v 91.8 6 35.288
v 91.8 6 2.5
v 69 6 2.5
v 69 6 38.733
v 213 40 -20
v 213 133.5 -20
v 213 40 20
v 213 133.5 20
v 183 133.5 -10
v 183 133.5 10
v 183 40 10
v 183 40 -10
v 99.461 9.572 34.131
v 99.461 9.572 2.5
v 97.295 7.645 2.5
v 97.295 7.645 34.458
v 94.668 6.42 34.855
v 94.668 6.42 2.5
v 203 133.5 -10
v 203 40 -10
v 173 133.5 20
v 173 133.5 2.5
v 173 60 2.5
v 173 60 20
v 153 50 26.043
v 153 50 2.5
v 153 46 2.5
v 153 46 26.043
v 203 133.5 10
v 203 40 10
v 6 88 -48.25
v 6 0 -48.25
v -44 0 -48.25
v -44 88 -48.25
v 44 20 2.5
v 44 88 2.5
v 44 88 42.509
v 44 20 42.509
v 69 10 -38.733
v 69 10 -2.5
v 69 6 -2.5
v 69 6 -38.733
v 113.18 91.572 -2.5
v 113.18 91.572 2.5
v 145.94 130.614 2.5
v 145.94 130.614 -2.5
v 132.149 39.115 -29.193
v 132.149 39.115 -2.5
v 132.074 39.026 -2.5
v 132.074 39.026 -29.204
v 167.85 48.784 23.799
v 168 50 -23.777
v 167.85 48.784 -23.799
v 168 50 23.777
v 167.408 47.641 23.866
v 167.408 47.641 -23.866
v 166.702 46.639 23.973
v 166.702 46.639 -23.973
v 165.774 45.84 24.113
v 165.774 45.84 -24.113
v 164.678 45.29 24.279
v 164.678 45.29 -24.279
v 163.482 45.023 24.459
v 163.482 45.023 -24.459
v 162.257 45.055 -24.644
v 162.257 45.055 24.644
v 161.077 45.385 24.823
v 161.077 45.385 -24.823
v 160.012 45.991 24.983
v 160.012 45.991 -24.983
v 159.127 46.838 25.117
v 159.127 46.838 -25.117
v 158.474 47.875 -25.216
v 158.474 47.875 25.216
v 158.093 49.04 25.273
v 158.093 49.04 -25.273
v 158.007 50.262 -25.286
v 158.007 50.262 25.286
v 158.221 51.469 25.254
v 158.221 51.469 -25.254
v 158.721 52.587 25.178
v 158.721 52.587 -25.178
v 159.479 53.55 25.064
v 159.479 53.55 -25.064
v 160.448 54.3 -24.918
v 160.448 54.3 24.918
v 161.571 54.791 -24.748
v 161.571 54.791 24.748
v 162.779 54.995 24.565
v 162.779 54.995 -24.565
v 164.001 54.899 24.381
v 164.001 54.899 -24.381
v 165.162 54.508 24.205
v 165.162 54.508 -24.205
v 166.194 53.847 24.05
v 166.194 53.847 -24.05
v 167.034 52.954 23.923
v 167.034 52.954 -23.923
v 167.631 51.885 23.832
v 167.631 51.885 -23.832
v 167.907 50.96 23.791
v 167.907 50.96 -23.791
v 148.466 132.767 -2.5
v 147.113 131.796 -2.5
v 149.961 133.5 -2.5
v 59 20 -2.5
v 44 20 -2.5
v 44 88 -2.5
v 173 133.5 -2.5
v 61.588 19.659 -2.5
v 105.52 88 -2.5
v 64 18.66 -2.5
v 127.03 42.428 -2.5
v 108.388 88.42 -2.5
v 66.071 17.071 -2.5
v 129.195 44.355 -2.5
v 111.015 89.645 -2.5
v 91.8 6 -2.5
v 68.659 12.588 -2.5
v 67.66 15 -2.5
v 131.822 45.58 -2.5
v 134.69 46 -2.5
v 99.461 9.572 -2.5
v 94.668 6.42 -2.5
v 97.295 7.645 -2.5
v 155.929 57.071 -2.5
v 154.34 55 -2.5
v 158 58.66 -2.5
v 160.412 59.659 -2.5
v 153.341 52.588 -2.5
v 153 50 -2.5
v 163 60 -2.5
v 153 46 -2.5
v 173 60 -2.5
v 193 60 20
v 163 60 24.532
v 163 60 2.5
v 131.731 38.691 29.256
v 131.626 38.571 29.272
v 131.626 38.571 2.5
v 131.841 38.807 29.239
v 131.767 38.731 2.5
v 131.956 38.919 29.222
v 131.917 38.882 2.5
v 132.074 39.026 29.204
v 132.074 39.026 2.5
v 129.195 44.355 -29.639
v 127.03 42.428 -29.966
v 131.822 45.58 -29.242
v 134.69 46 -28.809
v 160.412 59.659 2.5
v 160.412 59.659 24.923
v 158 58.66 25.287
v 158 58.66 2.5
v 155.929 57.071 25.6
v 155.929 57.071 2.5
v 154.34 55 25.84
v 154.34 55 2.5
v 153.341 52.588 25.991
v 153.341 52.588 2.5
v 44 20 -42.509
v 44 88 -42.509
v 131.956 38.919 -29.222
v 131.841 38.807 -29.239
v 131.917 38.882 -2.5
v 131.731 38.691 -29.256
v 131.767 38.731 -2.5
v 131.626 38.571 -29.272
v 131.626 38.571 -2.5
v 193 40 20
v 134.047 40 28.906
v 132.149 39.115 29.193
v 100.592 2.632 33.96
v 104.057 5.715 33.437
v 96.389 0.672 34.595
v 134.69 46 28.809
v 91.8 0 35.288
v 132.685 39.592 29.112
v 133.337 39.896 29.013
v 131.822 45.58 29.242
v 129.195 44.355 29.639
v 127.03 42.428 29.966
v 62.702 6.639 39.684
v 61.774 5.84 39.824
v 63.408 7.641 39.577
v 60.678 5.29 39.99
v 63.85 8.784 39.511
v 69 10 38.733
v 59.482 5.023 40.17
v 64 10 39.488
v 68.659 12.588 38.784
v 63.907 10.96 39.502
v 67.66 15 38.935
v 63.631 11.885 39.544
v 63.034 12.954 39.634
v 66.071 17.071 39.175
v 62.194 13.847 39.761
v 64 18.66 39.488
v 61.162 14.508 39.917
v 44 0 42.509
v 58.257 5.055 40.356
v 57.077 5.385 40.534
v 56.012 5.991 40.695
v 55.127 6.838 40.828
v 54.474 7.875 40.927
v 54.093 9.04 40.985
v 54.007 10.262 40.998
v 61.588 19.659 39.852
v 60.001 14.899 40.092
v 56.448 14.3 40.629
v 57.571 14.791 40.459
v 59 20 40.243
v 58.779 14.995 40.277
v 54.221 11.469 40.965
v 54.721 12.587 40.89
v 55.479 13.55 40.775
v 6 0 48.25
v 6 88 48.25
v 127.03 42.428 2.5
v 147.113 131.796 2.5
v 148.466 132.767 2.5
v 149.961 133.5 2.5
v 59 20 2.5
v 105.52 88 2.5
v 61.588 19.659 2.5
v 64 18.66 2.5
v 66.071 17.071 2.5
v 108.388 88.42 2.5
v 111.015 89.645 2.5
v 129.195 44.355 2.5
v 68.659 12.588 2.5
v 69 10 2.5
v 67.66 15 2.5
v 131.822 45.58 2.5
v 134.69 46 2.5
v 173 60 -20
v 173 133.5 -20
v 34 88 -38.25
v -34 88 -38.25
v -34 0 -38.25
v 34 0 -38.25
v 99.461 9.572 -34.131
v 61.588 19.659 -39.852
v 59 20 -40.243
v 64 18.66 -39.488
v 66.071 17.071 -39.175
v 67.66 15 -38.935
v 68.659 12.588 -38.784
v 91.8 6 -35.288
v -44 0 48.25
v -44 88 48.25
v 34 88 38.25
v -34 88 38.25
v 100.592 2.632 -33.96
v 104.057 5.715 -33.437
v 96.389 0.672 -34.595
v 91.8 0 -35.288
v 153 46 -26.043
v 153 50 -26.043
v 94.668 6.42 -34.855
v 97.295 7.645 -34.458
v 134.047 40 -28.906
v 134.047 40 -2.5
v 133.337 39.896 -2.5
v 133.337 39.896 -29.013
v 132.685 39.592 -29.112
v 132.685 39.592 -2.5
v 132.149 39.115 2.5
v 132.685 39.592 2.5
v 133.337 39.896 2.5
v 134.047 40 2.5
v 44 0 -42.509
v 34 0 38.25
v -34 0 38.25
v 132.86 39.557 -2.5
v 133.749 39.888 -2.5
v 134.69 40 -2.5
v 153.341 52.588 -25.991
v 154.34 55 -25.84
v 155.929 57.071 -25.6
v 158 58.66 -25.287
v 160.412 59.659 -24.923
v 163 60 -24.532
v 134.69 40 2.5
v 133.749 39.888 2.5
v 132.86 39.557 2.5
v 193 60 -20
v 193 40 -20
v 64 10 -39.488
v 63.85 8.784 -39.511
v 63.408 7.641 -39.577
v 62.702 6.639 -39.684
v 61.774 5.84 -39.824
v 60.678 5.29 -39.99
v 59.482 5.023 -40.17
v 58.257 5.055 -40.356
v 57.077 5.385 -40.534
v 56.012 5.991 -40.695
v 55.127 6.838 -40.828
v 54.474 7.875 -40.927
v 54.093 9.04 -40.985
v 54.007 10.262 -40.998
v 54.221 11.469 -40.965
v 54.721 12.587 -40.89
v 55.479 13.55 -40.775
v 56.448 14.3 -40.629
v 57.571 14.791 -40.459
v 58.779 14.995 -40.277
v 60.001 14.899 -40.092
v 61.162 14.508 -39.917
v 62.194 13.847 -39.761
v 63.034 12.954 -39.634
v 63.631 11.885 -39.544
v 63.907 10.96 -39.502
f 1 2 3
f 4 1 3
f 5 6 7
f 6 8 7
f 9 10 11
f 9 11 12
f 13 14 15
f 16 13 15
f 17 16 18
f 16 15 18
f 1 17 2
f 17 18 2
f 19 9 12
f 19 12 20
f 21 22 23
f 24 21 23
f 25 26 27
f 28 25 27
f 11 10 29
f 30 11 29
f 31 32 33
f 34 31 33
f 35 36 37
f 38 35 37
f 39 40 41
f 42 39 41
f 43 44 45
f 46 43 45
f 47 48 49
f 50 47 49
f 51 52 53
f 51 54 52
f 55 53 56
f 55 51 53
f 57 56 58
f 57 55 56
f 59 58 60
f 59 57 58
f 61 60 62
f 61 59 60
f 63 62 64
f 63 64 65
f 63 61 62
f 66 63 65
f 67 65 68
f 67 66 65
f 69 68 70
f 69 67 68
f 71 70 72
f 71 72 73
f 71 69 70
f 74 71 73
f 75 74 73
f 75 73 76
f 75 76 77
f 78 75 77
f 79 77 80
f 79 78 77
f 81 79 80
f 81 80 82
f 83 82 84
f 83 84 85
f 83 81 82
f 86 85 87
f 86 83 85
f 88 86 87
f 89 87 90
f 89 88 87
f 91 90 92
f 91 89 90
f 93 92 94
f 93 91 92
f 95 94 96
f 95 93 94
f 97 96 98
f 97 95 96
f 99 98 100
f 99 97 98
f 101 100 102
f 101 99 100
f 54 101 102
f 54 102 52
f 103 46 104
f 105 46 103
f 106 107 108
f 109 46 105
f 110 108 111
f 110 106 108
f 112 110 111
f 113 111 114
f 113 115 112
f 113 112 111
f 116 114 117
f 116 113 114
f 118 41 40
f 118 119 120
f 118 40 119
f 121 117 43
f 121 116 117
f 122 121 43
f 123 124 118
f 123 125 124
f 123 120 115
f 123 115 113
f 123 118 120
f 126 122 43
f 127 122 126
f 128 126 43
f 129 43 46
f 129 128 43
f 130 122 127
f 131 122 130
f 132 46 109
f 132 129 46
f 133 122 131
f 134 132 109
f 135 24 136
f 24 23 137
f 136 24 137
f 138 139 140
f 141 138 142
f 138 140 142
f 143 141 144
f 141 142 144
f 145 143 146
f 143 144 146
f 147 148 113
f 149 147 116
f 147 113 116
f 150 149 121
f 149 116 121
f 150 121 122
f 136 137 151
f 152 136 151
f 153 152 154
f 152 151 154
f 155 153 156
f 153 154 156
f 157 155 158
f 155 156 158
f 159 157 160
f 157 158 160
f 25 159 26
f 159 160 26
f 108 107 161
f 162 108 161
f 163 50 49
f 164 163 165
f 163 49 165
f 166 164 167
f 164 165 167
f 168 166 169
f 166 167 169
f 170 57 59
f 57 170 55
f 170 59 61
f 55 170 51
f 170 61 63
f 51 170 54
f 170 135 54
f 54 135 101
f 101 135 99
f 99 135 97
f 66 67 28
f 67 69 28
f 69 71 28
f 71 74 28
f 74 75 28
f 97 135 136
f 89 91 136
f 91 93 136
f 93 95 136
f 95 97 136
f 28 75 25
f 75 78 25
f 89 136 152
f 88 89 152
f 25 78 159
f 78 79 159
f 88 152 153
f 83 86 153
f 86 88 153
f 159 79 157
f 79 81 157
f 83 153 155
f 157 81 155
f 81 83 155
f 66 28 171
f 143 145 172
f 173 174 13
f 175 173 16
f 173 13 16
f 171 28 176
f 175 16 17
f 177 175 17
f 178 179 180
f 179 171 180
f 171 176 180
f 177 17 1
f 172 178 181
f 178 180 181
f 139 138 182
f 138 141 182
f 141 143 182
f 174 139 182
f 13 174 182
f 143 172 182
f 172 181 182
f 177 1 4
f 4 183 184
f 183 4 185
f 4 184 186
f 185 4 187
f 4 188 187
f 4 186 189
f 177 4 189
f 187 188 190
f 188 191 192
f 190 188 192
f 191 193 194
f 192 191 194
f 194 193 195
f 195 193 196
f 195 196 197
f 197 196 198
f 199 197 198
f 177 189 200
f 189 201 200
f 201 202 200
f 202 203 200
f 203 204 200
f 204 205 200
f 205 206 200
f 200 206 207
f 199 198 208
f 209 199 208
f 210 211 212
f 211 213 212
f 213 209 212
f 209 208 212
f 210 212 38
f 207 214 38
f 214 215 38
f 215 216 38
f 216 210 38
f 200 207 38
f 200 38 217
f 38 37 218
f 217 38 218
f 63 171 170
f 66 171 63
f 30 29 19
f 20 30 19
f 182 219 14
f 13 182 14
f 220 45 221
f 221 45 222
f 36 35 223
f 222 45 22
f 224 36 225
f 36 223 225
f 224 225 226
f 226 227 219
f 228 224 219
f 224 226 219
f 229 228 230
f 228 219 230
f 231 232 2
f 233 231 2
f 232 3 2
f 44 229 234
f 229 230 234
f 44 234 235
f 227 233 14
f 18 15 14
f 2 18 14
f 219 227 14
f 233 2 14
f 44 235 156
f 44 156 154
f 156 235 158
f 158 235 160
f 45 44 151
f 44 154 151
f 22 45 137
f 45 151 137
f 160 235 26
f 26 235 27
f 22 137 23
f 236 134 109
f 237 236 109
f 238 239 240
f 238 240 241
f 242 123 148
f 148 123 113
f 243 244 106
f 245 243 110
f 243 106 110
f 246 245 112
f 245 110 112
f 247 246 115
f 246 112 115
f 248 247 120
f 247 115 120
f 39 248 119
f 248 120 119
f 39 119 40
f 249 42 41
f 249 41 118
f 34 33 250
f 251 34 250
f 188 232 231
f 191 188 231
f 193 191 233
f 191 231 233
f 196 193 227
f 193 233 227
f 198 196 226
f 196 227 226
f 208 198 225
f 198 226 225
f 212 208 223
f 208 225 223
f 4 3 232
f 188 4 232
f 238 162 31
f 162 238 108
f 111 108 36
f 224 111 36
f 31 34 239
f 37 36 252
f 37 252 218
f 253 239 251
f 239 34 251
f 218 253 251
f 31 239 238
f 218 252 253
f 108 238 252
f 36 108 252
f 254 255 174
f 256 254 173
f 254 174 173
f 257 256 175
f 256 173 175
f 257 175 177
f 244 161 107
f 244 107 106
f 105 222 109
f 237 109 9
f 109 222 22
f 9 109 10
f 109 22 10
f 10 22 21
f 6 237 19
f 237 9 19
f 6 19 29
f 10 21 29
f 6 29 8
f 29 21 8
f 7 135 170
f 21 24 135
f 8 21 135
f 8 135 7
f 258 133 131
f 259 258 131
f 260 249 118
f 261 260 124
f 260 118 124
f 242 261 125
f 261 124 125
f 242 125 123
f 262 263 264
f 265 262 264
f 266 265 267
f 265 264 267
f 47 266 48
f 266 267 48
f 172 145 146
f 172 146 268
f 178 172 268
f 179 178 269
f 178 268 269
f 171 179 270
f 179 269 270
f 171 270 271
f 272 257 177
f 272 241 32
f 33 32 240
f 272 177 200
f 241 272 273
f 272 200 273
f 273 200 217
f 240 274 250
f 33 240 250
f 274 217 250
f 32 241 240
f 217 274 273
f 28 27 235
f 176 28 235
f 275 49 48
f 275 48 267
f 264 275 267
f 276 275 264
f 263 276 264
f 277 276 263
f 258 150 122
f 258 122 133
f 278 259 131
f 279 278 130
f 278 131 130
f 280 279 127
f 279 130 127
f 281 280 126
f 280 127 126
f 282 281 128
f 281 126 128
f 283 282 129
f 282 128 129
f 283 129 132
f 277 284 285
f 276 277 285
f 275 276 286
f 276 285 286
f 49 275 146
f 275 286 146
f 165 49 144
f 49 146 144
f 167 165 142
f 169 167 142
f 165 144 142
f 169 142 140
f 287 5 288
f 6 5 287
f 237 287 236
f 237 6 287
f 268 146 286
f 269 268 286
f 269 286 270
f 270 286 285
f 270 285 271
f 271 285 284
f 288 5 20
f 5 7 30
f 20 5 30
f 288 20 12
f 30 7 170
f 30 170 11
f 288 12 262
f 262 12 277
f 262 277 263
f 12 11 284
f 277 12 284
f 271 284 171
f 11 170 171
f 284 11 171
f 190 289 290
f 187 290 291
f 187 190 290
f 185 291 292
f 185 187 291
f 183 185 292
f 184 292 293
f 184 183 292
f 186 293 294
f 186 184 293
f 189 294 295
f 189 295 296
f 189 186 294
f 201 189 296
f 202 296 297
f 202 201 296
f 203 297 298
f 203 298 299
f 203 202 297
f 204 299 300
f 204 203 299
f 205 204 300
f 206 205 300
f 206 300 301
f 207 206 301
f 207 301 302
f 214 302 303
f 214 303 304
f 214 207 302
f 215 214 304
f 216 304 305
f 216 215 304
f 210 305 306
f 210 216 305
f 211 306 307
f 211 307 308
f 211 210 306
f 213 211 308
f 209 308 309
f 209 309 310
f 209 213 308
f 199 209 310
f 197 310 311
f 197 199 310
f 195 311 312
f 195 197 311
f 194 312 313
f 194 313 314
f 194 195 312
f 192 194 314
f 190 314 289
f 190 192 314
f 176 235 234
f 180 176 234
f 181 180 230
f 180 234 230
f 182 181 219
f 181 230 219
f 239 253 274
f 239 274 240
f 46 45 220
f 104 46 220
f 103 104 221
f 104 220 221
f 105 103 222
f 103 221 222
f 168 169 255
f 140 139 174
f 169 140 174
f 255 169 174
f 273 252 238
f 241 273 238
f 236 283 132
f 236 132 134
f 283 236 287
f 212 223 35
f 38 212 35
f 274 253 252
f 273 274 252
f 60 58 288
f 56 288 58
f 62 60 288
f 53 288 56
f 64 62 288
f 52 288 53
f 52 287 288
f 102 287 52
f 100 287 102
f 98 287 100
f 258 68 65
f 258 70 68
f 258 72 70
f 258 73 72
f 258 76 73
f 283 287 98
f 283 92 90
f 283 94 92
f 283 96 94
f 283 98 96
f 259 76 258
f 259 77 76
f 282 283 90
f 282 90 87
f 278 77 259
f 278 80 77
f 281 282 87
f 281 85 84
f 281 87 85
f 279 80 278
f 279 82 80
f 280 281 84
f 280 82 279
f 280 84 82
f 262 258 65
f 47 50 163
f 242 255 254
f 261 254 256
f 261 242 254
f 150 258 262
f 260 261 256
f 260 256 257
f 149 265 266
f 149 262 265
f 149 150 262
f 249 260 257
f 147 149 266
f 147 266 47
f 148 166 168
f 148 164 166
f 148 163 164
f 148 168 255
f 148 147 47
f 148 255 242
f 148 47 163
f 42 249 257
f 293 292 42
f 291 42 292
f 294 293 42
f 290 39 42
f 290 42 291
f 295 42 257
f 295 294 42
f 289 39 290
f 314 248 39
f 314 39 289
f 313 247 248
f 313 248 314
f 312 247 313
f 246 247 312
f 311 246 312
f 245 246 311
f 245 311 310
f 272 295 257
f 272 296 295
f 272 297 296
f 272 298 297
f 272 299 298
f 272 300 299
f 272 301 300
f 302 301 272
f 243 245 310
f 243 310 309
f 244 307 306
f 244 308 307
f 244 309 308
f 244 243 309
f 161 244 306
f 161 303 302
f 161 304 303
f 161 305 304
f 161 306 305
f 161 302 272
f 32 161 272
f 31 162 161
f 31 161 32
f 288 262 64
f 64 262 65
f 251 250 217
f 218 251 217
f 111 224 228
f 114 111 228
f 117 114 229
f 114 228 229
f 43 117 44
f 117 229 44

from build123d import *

# Parameters (mm, degrees)
BOSS_EXTRU_3_DEPTH       = 88
ESQUISSE4_W              = 68
ESQUISSE4_H              = 76.5
ENL_V_MAT_EXTRU_1_DEPTH  = 236.459258684
ENL_V_MAT_EXTRU_2_DEPTH  = 68
ENL_V_MAT_EXTRU_5_REACH  = 245.615
ESQUISSE6_W              = 150.690647389
ESQUISSE6_H              = 20
BOSS_EXTRU_5_DEPTH       = 20
ESQUISSE14_W             = 40
ESQUISSE14_H             = 40
ENL_V_MAT_EXTRU_6_DEPTH  = 236.459258684
BOSS_EXTRU_8_DEPTH       = 40
ENL_V_MAT_EXTRU_7_DEPTH  = 236.984242059
ESQUISSE27_W             = 169
ESQUISSE27_H             = 5
BOSS_EXTRU_9_DEPTH       = 45.5
BOSS_EXTRU_10_REACH      = 258.45
ESQUISSE28_R             = 5
ENL_V_MAT_EXTRU_9_DEPTH  = 45.5
BOSS_EXTRU_12_DEPTH      = 17.5
ENL_V_MAT_EXTRU_10_REACH = 248.129
BOSS_EXTRU_13_REACH      = 258.45
ESQUISSE34_R             = 5
BOSS_EXTRU_14_DEPTH      = 17.5
ESQUISSE36_W             = 20
ESQUISSE36_H             = 20
ENL_V_MAT_EXTRU_11_DEPTH = 256.967405152
ESQUISSE37_R             = 5
ENL_V_MAT_EXTRU_12_DEPTH = 10
ESQUISSE38_R             = 5
ENL_V_MAT_EXTRU_13_DEPTH = 10


with BuildPart() as part:
    # Esquisse1 → Boss.-Extru.3 (new body)
    with BuildSketch(Plane(origin=(0, 0, 0), x_dir=(1, 0, 0), z_dir=(0, 1, 0))):
        Polygon((193, 20), (6, 48.25), (-44, 48.25), (-44, -48.25), (6, -48.25), (193, -20), (213, -20), (213, 20), align=None)
    extrude(amount=BOSS_EXTRU_3_DEPTH)

    # Esquisse4 → Enlèv. mat.-Extru.1 (cut, through all)
    with BuildSketch(Plane(origin=(0, 88, 0), x_dir=(1, 0, 0), z_dir=(0, 1, 0))):
        Rectangle(ESQUISSE4_W, ESQUISSE4_H)
    extrude(amount=-ENL_V_MAT_EXTRU_1_DEPTH, mode=Mode.SUBTRACT)

    # Esquisse5 → Enlèv. mat.-Extru.2 (cut)
    with BuildSketch(Plane(origin=(0, 88, 0), x_dir=(1, 0, 0), z_dir=(0, 1, 0))):
        Polygon((193, 20), (173, 20), (173, 2.5), (44, 2.5), (44, 42.509358289), align=None)
        Polygon((173, -20), (193, -20), (44, -42.509358289), (44, -2.5), (173, -2.5), align=None)
    extrude(amount=-ENL_V_MAT_EXTRU_2_DEPTH, mode=Mode.SUBTRACT)

    # Enlèv. mat.-Extru.5: up to this plane
    enl_v_mat_extru_5_end = Plane(origin=(173, 20, 2.5), z_dir=(0, 0, -1))
    # Esquisse6 → Enlèv. mat.-Extru.5 (cut, up to the surface)
    with BuildSketch(Plane(origin=(7.260340781, 0, 48.059600925), x_dir=(0.9887806747234926, 0, -0.14937462064673088), z_dir=(0.14937462064673088, 0, 0.9887806747234927)), mode=Mode.PRIVATE) as enl_v_mat_extru_5_sk1:
        with Locations((112.501854115, 10)):
            Rectangle(ESQUISSE6_W, ESQUISSE6_H)
    enl_v_mat_extru_5_tool1 = split(extrude(enl_v_mat_extru_5_sk1.sketch, amount=-ENL_V_MAT_EXTRU_5_REACH, mode=Mode.PRIVATE), bisect_by=enl_v_mat_extru_5_end, keep=Keep.BOTH, mode=Mode.PRIVATE)
    add(enl_v_mat_extru_5_tool1.solids().sort_by_distance((118.5, 10, 31.254679))[0], mode=Mode.SUBTRACT)

    # Esquisse11 → Boss.-Extru.5 (add)
    with BuildSketch(Plane.XZ.offset(-20)):
        Polygon((37.955805499, 2.5), (44, 2.5), (44, 42.509358289), align=None)
    extrude(amount=BOSS_EXTRU_5_DEPTH)

    # Esquisse14 → Enlèv. mat.-Extru.6 (cut, through all)
    with BuildSketch(Plane(origin=(0, 88, 0), x_dir=(1, 0, 0), z_dir=(0, 1, 0))):
        with Locations((193, 0)):
            Rectangle(ESQUISSE14_W, ESQUISSE14_H)
    extrude(amount=-ENL_V_MAT_EXTRU_6_DEPTH, mode=Mode.SUBTRACT)

    # Esquisse22 → Boss.-Extru.8 (add)
    with BuildSketch(Plane(origin=(173, 0, 0), x_dir=(0, 0, -1), z_dir=(1, 0, 0))):
        Polygon((-2.5, 0), (20, 0), (20, 20), (2.5, 20), (2.5, 88), (-2.5, 88), align=None)
    extrude(amount=BOSS_EXTRU_8_DEPTH)

    # Esquisse23 → Enlèv. mat.-Extru.7 (cut, through all)
    with BuildSketch(Plane.XY.offset(2.5)):
        with BuildLine():
            Line((213, 0), (213, 40))
            Line((213, 40), (193, 40))
            Line((193, 40), (159, 40))
            Line((159, 40), (134.690473047, 40))
            ThreePointArc((134.690473047, 40), (133, 39.625231148), (131.626295274, 38.571150439))
            Line((131.626295274, 38.571150439), (104.057045727, 5.715398245))
            ThreePointArc((104.057045727, 5.715398245), (98.562226825, 1.499075407), (91.800334637, 0))
            Line((91.800334637, 0), (213, 0))
        make_face()
    extrude(amount=-ENL_V_MAT_EXTRU_7_DEPTH, mode=Mode.SUBTRACT)

    # Esquisse27 → Boss.-Extru.9 (add)
    with BuildSketch(Plane(origin=(0, 88, 0), x_dir=(1, 0, 0), z_dir=(0, 1, 0))):
        with Locations((128.5, 0)):
            Rectangle(ESQUISSE27_W, ESQUISSE27_H)
    extrude(amount=BOSS_EXTRU_9_DEPTH)

    # Boss.-Extru.10: up to this plane
    boss_extru_10_end = Plane(origin=(7.260340781, 88, 48.059600925), z_dir=(-0.14937462064673085, 0, -0.9887806747234926))
    # Esquisse28 → Boss.-Extru.10 (add, up to the surface)
    with BuildSketch(Plane.XY.offset(2.5), mode=Mode.PRIVATE) as boss_extru_10_sk1:
        with BuildLine():
            Line((132.074257782, 39.025792076), (132.14881397, 39.114644681))
            ThreePointArc((132.14881397, 39.114644681), (133, 39.767782693), (134.047464579, 40))
            Line((134.047464579, 40), (134.690473047, 40))
            Line((134.690473047, 40), (159, 40))
            Line((159, 40), (193, 40))
            Line((193, 40), (193, 60))
            Line((193, 60), (173, 60))
            Line((173, 60), (163, 60))
            ThreePointArc((163, 60), (155.928932188, 57.071067812), (153, 50))
            Line((153, 50), (153, 46))
            Line((153, 46), (134.690473047, 46))
            ThreePointArc((134.690473047, 46), (130.46429043, 45.06307787), (127.030028616, 42.427876097))
            Line((127.030028616, 42.427876097), (99.460779068, 9.572123903))
            ThreePointArc((99.460779068, 9.572123903), (96.026517254, 6.93692213), (91.800334637, 6))
            Line((91.800334637, 6), (69, 6))
            Line((69, 6), (69, 10))
            ThreePointArc((69, 10), (66.071067812, 17.071067812), (59, 20))
            Line((59, 20), (44, 20))
            Line((44, 20), (44, 0))
            Line((44, 0), (63, 0))
            Line((63, 0), (91.800334637, 0))
            ThreePointArc((91.800334637, 0), (98.562226825, 1.499075407), (104.057045727, 5.715398245))
            Line((104.057045727, 5.715398245), (131.626295274, 38.571150439))
            ThreePointArc((131.626295274, 38.571150439), (131.841194012, 38.807420343), (132.074257782, 39.025792076))
        make_face()
        with Locations((59, 10)):
            Circle(ESQUISSE28_R, mode=Mode.SUBTRACT)
        with Locations((163, 50)):
            Circle(ESQUISSE28_R, mode=Mode.SUBTRACT)
    boss_extru_10_tool1 = split(extrude(boss_extru_10_sk1.sketch, amount=BOSS_EXTRU_10_REACH, mode=Mode.PRIVATE), bisect_by=boss_extru_10_end, keep=Keep.BOTH, mode=Mode.PRIVATE)
    add(boss_extru_10_tool1.solids().sort_by_distance((124.318782, 30.344637, 2.5))[0])

    # Esquisse29 → Enlèv. mat.-Extru.9 (cut)
    with BuildSketch(Plane.XY.offset(2.5)):
        with BuildLine():
            ThreePointArc((145.939599002, 130.613536933), (147.768845256, 132.309522469), (149.96093833, 133.5))
            Line((149.96093833, 133.5), (44, 133.5))
            Line((44, 133.5), (44, 88))
            Line((44, 88), (105.519519296, 88))
            ThreePointArc((105.519519296, 88), (109.745701914, 88.93692213), (113.179963727, 91.572123903))
            Line((113.179963727, 91.572123903), (145.939599002, 130.613536933))
        make_face()
    extrude(amount=-ENL_V_MAT_EXTRU_9_DEPTH, mode=Mode.SUBTRACT)

    # Esquisse31 → Boss.-Extru.12 (add)
    with BuildSketch(Plane.XY.offset(2.5)):
        Polygon((213, 133.5), (173, 133.5), (173, 60), (193, 60), (193, 40), (213, 40), align=None)
    extrude(amount=BOSS_EXTRU_12_DEPTH)

    # Esquisse33 → Enlèv. mat.-Extru.10 (cut, up to next)
    with BuildSketch(Plane(origin=(0, 20, 0), x_dir=(1, 0, 0), z_dir=(0, 1, 0)), mode=Mode.PRIVATE) as enl_v_mat_extru_10_sk1:
        Polygon((44, 42.509358289), (44, 2.5), (116.043249791, 2.5), (116.043249791, 31.625819216), align=None)
    enl_v_mat_extru_10_tool1 = extrude(enl_v_mat_extru_10_sk1.sketch, amount=-ENL_V_MAT_EXTRU_10_REACH, mode=Mode.PRIVATE) & part.part
    add(enl_v_mat_extru_10_tool1.solids().sort_by_distance((78.131402, 20, -19.926572))[0], mode=Mode.SUBTRACT)

    # Boss.-Extru.13: up to this plane
    boss_extru_13_end = Plane(origin=(7.260340781, 88, -48.059600925), z_dir=(0.14937462064673085, 0, -0.9887806747234926))
    # Esquisse34 → Boss.-Extru.13 (add, up to the surface)
    with BuildSketch(Plane(origin=(0, 0, -2.5), x_dir=(-1, 0, 0), z_dir=(0, 0, -1)), mode=Mode.PRIVATE) as boss_extru_13_sk1:
        with BuildLine():
            Line((-44, 0), (-44, 20))
            Line((-44, 20), (-59, 20))
            ThreePointArc((-59, 20), (-66.071067812, 17.071067812), (-69, 10))
            Line((-69, 10), (-69, 6))
            Line((-69, 6), (-91.800334637, 6))
            ThreePointArc((-91.800334637, 6), (-96.026517254, 6.93692213), (-99.460779068, 9.572123903))
            Line((-99.460779068, 9.572123903), (-127.030028616, 42.427876097))
            ThreePointArc((-127.030028616, 42.427876097), (-130.46429043, 45.06307787), (-134.690473047, 46))
            Line((-134.690473047, 46), (-153, 46))
            Line((-153, 46), (-153, 50))
            ThreePointArc((-153, 50), (-155.928932188, 57.071067812), (-163, 60))
            Line((-163, 60), (-173, 60))
            Line((-173, 60), (-193, 60))
            Line((-193, 60), (-193, 40))
            Line((-193, 40), (-159, 40))
            Line((-159, 40), (-134.690473047, 40))
            Line((-134.690473047, 40), (-134.047464579, 40))
            ThreePointArc((-134.047464579, 40), (-133, 39.767782693), (-132.14881397, 39.114644681))
            Line((-132.14881397, 39.114644681), (-132.074257782, 39.025792076))
            ThreePointArc((-132.074257782, 39.025792076), (-131.841194012, 38.807420343), (-131.626295274, 38.571150439))
            Line((-131.626295274, 38.571150439), (-104.057045727, 5.715398245))
            ThreePointArc((-104.057045727, 5.715398245), (-98.562226825, 1.499075407), (-91.800334637, 0))
            Line((-91.800334637, 0), (-63, 0))
            Line((-63, 0), (-44, 0))
        make_face()
        with Locations(Location((-163, 50, 0), (0, 0, 180))):
            Circle(ESQUISSE34_R, mode=Mode.SUBTRACT)
        with Locations(Location((-59, 10, 0), (0, 0, 180))):
            Circle(ESQUISSE34_R, mode=Mode.SUBTRACT)
    boss_extru_13_tool1 = split(extrude(boss_extru_13_sk1.sketch, amount=BOSS_EXTRU_13_REACH, mode=Mode.PRIVATE), bisect_by=boss_extru_13_end, keep=Keep.BOTH, mode=Mode.PRIVATE)
    add(boss_extru_13_tool1.solids().sort_by_distance((124.318782, 30.344637, -2.5))[0])

    # Esquisse35 → Boss.-Extru.14 (add)
    with BuildSketch(Plane(origin=(0, 0, -2.5), x_dir=(-1, 0, 0), z_dir=(0, 0, -1))):
        Polygon((-173, 60), (-173, 133.5), (-213, 133.5), (-213, 40), (-193, 40), (-193, 60), align=None)
    extrude(amount=BOSS_EXTRU_14_DEPTH)

    # Esquisse36 → Enlèv. mat.-Extru.11 (cut, through all)
    with BuildSketch(Plane(origin=(0, 133.5, 0), x_dir=(1, 0, 0), z_dir=(0, 1, 0))):
        with Locations((193, 0)):
            Rectangle(ESQUISSE36_W, ESQUISSE36_H)
    extrude(amount=-ENL_V_MAT_EXTRU_11_DEPTH, mode=Mode.SUBTRACT)

    # Esquisse37 → Enlèv. mat.-Extru.12 (cut)
    with BuildSketch(Plane.XY.offset(2.5)):
        with Locations((59, 10)):
            Circle(ESQUISSE37_R)
    extrude(amount=-ENL_V_MAT_EXTRU_12_DEPTH, mode=Mode.SUBTRACT)

    # Esquisse38 → Enlèv. mat.-Extru.13 (cut)
    with BuildSketch(Plane.XY.offset(2.5)):
        with Locations((163, 50)):
            Circle(ESQUISSE38_R)
    extrude(amount=-ENL_V_MAT_EXTRU_13_DEPTH, mode=Mode.SUBTRACT)


solid = part.part
